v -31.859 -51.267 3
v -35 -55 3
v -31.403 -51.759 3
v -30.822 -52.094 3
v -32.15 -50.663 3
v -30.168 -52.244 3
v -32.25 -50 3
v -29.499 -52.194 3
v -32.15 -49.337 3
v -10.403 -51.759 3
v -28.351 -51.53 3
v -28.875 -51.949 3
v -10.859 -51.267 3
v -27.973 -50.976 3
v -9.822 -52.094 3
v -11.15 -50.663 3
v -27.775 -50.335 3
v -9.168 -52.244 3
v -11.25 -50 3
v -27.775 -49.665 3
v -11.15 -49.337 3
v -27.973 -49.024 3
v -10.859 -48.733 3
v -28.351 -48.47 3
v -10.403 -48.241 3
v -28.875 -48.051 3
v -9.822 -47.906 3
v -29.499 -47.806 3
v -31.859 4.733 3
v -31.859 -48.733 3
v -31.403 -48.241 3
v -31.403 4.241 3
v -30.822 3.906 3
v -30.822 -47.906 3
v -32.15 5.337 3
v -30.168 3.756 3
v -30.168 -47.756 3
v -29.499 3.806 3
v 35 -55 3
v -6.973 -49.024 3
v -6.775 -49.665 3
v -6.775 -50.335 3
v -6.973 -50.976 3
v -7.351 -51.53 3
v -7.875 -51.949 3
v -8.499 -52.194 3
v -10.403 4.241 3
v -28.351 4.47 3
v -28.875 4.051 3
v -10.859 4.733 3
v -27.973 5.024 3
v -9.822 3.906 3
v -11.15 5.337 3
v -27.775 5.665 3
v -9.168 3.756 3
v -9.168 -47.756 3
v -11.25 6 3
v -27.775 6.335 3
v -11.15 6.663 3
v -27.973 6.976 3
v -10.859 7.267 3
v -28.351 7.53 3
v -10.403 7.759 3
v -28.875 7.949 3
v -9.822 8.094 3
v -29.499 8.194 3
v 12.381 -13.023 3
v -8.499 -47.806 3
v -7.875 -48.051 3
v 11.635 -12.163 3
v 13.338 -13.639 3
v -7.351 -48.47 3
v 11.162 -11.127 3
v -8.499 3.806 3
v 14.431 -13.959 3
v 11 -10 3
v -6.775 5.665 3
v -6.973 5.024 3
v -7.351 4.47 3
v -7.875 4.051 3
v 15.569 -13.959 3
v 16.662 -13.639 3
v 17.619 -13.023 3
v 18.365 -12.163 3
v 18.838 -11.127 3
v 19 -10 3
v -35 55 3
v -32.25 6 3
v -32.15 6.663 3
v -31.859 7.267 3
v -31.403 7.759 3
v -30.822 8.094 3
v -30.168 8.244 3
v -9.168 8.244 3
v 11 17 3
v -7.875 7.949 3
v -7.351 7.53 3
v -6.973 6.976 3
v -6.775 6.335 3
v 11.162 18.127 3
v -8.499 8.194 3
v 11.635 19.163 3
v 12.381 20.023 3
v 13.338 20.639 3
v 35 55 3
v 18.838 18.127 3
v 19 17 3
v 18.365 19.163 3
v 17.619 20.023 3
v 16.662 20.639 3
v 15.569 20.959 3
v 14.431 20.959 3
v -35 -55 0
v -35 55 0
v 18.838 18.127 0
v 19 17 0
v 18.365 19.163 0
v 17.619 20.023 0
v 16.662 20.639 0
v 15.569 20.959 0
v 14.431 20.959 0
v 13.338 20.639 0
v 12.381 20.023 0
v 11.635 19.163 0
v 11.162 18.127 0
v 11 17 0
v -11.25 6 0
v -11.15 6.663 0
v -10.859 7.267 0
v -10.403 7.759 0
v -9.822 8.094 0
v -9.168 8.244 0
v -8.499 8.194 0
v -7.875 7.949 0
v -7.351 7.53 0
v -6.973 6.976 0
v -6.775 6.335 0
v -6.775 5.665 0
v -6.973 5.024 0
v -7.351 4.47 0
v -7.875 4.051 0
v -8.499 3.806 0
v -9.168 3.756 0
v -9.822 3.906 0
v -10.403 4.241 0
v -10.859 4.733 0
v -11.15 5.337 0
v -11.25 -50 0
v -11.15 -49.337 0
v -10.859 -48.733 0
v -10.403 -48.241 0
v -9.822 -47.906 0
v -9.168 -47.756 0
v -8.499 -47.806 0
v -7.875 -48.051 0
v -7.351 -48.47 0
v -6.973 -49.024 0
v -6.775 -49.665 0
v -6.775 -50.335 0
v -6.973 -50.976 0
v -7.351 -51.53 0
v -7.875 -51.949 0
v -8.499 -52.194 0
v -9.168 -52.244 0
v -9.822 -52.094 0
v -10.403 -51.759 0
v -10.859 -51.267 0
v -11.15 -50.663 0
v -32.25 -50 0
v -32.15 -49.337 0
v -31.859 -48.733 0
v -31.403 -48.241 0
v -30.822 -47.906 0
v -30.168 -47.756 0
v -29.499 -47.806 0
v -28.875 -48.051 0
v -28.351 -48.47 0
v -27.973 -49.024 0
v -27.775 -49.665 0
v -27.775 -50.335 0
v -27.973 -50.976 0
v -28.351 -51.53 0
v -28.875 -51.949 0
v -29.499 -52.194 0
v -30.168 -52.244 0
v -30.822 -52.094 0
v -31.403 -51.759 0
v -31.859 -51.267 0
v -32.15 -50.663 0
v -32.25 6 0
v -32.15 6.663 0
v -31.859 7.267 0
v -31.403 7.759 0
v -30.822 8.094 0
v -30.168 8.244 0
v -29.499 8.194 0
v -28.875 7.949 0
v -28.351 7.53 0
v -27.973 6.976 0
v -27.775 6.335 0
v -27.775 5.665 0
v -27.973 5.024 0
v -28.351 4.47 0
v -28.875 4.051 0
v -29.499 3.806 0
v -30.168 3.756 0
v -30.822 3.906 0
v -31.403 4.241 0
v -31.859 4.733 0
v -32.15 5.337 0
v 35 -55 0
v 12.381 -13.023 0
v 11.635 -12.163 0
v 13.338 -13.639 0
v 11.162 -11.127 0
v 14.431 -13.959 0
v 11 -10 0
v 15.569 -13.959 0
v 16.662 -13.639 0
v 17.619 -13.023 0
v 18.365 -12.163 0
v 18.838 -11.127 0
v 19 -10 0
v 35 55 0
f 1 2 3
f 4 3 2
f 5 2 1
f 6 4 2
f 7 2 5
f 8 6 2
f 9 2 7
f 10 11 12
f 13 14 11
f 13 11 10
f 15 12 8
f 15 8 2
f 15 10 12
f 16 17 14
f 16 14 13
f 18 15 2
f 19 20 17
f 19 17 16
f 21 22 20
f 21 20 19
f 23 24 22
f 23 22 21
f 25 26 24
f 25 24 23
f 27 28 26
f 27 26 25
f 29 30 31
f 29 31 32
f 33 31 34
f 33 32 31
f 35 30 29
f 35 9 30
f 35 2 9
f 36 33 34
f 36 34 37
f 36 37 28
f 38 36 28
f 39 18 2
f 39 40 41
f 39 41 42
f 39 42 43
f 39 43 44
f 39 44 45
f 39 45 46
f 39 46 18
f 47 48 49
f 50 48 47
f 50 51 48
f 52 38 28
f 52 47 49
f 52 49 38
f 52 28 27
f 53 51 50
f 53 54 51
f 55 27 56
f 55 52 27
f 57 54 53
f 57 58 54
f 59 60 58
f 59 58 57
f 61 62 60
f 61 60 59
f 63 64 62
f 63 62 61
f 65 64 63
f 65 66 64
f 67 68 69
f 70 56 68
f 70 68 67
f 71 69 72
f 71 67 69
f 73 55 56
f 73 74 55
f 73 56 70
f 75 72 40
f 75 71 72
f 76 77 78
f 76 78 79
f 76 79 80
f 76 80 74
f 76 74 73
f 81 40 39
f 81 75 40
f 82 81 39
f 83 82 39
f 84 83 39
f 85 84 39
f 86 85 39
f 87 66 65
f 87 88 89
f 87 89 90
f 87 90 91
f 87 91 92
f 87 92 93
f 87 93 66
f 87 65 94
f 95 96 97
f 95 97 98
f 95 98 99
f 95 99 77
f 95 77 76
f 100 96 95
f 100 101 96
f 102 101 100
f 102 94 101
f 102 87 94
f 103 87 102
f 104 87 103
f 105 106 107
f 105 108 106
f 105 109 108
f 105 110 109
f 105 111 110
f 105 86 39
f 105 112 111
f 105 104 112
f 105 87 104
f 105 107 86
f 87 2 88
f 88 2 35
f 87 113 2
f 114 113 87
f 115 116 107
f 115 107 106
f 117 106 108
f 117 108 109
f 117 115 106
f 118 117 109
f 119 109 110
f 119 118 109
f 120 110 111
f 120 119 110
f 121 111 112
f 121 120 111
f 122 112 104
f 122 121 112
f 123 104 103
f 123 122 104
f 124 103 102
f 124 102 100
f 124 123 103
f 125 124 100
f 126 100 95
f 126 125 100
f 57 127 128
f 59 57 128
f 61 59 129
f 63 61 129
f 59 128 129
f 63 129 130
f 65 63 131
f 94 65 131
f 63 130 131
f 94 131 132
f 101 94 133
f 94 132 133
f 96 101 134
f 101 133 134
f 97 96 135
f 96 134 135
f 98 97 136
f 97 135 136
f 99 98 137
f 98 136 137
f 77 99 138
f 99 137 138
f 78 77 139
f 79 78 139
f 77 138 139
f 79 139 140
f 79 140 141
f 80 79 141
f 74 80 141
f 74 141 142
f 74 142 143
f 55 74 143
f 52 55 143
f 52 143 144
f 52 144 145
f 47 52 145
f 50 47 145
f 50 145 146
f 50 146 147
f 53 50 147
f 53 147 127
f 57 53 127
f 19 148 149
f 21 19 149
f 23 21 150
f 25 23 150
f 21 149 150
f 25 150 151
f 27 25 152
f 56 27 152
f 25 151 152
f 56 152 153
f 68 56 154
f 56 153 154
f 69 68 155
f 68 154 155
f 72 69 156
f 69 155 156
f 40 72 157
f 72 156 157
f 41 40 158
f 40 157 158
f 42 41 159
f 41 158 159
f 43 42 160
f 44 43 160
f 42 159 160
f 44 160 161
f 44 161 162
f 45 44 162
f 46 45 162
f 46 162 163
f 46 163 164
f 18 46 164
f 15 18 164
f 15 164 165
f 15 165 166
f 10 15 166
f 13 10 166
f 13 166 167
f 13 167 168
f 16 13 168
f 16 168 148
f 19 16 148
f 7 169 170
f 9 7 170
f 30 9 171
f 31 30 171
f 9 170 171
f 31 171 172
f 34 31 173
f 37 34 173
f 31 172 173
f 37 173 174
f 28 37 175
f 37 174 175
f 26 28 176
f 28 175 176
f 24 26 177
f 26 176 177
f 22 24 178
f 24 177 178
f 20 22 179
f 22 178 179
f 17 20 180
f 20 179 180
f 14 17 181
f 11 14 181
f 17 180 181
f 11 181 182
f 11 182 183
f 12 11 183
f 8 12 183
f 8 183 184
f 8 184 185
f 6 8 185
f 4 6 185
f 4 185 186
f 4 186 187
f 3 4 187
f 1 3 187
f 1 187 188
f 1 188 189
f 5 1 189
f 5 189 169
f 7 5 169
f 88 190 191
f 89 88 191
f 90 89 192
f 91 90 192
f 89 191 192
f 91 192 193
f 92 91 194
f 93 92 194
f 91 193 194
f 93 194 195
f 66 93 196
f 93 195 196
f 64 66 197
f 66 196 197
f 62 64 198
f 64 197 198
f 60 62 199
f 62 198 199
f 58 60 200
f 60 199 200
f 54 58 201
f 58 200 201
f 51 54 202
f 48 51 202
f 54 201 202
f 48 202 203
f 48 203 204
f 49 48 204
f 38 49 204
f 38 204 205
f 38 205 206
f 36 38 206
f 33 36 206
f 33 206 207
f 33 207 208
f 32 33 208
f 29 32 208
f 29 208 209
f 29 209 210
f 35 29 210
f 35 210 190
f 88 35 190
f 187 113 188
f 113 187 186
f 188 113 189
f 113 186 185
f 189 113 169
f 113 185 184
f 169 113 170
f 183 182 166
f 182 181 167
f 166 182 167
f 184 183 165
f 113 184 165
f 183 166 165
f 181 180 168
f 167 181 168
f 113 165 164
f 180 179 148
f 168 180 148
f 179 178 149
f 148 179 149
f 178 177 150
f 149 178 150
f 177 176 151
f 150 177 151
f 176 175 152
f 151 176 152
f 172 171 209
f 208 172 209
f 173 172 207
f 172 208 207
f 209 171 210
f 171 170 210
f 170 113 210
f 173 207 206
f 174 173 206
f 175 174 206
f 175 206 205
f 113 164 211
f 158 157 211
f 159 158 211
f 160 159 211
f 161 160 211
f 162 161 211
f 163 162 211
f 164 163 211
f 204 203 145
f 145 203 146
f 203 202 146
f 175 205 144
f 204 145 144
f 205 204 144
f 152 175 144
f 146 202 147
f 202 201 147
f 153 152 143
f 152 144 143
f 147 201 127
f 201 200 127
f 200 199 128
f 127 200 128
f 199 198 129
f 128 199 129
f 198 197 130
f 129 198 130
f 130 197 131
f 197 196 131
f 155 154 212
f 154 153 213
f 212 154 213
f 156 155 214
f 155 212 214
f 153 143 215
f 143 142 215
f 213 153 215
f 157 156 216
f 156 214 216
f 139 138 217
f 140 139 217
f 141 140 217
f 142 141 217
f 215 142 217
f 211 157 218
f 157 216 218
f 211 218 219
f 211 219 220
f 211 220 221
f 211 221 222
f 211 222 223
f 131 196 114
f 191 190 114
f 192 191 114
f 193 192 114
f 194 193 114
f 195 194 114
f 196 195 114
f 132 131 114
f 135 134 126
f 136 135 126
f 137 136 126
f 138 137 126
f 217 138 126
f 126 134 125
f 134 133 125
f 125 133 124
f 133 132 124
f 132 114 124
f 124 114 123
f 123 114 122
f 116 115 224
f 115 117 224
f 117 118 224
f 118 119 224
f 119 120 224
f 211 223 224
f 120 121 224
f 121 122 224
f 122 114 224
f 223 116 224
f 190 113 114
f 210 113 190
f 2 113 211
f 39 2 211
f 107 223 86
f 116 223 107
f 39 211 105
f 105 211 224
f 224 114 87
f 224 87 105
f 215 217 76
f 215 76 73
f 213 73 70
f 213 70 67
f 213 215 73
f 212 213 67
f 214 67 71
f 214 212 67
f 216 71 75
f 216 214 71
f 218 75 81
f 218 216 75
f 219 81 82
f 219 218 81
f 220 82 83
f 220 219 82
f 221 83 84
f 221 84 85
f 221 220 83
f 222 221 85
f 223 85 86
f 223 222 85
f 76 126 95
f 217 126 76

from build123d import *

# Parameters (mm, degrees)
SKIZZE1_W                           = 70
SKIZZE1_H                           = 110
AUFSATZ_LINEAR_AUSTRAGEN1_DEPTH     = 3
DURCHGANGSLOCH_F_R_M41_D            = 4.5
LINEARES_MUSTER1_COUNT              = 2
LINEARES_MUSTER1_PITCH              = 56
LINEARES_MUSTER1_COUNT_DIR2         = 2
LINEARES_MUSTER1_PITCH_DIR2         = 21
F_8_0_8_DURCHMESSER_LANGLOCH4_DEPTH = 3


# Read off the part's stored shape, not the designer's step: Ø8.0 (8) Durchmesser Langloch4
with BuildPart() as part:
    # Skizze1 → Aufsatz-Linear austragen1 (new body)
    with BuildSketch(Plane.XY):
        Rectangle(SKIZZE1_W, SKIZZE1_H)
    extrude(amount=AUFSATZ_LINEAR_AUSTRAGEN1_DEPTH)

    # Durchgangsloch für M41 (through all)
    with Locations(Plane.XY.offset(3)):
        with Locations((-30, -50)):
            durchgangsloch_f_r_m41 = Hole(DURCHGANGSLOCH_F_R_M41_D / 2)

    # Lineares Muster1: Durchgangsloch f_r M41 2 × 2
    with Locations(*[(j * LINEARES_MUSTER1_PITCH_DIR2, i * LINEARES_MUSTER1_PITCH, 0) for i in range(LINEARES_MUSTER1_COUNT) for j in range(LINEARES_MUSTER1_COUNT_DIR2) if (i, j) != (0, 0)]):
        add(durchgangsloch_f_r_m41, mode=Mode.SUBTRACT)

    # Ø8.0 (8) Durchmesser Langloch4 outline → Ø8.0 (8) Durchmesser Langloch4 (cut)
    with BuildSketch(Plane.XY):
        with BuildLine():
            Line((19, -10), (19, 17))
            ThreePointArc((19, 17), (15, 21), (11, 17))
            Line((11, 17), (11, -10))
            ThreePointArc((11, -10), (15, -14), (19, -10))
        make_face()
    extrude(amount=F_8_0_8_DURCHMESSER_LANGLOCH4_DEPTH, mode=Mode.SUBTRACT)


solid = part.part
